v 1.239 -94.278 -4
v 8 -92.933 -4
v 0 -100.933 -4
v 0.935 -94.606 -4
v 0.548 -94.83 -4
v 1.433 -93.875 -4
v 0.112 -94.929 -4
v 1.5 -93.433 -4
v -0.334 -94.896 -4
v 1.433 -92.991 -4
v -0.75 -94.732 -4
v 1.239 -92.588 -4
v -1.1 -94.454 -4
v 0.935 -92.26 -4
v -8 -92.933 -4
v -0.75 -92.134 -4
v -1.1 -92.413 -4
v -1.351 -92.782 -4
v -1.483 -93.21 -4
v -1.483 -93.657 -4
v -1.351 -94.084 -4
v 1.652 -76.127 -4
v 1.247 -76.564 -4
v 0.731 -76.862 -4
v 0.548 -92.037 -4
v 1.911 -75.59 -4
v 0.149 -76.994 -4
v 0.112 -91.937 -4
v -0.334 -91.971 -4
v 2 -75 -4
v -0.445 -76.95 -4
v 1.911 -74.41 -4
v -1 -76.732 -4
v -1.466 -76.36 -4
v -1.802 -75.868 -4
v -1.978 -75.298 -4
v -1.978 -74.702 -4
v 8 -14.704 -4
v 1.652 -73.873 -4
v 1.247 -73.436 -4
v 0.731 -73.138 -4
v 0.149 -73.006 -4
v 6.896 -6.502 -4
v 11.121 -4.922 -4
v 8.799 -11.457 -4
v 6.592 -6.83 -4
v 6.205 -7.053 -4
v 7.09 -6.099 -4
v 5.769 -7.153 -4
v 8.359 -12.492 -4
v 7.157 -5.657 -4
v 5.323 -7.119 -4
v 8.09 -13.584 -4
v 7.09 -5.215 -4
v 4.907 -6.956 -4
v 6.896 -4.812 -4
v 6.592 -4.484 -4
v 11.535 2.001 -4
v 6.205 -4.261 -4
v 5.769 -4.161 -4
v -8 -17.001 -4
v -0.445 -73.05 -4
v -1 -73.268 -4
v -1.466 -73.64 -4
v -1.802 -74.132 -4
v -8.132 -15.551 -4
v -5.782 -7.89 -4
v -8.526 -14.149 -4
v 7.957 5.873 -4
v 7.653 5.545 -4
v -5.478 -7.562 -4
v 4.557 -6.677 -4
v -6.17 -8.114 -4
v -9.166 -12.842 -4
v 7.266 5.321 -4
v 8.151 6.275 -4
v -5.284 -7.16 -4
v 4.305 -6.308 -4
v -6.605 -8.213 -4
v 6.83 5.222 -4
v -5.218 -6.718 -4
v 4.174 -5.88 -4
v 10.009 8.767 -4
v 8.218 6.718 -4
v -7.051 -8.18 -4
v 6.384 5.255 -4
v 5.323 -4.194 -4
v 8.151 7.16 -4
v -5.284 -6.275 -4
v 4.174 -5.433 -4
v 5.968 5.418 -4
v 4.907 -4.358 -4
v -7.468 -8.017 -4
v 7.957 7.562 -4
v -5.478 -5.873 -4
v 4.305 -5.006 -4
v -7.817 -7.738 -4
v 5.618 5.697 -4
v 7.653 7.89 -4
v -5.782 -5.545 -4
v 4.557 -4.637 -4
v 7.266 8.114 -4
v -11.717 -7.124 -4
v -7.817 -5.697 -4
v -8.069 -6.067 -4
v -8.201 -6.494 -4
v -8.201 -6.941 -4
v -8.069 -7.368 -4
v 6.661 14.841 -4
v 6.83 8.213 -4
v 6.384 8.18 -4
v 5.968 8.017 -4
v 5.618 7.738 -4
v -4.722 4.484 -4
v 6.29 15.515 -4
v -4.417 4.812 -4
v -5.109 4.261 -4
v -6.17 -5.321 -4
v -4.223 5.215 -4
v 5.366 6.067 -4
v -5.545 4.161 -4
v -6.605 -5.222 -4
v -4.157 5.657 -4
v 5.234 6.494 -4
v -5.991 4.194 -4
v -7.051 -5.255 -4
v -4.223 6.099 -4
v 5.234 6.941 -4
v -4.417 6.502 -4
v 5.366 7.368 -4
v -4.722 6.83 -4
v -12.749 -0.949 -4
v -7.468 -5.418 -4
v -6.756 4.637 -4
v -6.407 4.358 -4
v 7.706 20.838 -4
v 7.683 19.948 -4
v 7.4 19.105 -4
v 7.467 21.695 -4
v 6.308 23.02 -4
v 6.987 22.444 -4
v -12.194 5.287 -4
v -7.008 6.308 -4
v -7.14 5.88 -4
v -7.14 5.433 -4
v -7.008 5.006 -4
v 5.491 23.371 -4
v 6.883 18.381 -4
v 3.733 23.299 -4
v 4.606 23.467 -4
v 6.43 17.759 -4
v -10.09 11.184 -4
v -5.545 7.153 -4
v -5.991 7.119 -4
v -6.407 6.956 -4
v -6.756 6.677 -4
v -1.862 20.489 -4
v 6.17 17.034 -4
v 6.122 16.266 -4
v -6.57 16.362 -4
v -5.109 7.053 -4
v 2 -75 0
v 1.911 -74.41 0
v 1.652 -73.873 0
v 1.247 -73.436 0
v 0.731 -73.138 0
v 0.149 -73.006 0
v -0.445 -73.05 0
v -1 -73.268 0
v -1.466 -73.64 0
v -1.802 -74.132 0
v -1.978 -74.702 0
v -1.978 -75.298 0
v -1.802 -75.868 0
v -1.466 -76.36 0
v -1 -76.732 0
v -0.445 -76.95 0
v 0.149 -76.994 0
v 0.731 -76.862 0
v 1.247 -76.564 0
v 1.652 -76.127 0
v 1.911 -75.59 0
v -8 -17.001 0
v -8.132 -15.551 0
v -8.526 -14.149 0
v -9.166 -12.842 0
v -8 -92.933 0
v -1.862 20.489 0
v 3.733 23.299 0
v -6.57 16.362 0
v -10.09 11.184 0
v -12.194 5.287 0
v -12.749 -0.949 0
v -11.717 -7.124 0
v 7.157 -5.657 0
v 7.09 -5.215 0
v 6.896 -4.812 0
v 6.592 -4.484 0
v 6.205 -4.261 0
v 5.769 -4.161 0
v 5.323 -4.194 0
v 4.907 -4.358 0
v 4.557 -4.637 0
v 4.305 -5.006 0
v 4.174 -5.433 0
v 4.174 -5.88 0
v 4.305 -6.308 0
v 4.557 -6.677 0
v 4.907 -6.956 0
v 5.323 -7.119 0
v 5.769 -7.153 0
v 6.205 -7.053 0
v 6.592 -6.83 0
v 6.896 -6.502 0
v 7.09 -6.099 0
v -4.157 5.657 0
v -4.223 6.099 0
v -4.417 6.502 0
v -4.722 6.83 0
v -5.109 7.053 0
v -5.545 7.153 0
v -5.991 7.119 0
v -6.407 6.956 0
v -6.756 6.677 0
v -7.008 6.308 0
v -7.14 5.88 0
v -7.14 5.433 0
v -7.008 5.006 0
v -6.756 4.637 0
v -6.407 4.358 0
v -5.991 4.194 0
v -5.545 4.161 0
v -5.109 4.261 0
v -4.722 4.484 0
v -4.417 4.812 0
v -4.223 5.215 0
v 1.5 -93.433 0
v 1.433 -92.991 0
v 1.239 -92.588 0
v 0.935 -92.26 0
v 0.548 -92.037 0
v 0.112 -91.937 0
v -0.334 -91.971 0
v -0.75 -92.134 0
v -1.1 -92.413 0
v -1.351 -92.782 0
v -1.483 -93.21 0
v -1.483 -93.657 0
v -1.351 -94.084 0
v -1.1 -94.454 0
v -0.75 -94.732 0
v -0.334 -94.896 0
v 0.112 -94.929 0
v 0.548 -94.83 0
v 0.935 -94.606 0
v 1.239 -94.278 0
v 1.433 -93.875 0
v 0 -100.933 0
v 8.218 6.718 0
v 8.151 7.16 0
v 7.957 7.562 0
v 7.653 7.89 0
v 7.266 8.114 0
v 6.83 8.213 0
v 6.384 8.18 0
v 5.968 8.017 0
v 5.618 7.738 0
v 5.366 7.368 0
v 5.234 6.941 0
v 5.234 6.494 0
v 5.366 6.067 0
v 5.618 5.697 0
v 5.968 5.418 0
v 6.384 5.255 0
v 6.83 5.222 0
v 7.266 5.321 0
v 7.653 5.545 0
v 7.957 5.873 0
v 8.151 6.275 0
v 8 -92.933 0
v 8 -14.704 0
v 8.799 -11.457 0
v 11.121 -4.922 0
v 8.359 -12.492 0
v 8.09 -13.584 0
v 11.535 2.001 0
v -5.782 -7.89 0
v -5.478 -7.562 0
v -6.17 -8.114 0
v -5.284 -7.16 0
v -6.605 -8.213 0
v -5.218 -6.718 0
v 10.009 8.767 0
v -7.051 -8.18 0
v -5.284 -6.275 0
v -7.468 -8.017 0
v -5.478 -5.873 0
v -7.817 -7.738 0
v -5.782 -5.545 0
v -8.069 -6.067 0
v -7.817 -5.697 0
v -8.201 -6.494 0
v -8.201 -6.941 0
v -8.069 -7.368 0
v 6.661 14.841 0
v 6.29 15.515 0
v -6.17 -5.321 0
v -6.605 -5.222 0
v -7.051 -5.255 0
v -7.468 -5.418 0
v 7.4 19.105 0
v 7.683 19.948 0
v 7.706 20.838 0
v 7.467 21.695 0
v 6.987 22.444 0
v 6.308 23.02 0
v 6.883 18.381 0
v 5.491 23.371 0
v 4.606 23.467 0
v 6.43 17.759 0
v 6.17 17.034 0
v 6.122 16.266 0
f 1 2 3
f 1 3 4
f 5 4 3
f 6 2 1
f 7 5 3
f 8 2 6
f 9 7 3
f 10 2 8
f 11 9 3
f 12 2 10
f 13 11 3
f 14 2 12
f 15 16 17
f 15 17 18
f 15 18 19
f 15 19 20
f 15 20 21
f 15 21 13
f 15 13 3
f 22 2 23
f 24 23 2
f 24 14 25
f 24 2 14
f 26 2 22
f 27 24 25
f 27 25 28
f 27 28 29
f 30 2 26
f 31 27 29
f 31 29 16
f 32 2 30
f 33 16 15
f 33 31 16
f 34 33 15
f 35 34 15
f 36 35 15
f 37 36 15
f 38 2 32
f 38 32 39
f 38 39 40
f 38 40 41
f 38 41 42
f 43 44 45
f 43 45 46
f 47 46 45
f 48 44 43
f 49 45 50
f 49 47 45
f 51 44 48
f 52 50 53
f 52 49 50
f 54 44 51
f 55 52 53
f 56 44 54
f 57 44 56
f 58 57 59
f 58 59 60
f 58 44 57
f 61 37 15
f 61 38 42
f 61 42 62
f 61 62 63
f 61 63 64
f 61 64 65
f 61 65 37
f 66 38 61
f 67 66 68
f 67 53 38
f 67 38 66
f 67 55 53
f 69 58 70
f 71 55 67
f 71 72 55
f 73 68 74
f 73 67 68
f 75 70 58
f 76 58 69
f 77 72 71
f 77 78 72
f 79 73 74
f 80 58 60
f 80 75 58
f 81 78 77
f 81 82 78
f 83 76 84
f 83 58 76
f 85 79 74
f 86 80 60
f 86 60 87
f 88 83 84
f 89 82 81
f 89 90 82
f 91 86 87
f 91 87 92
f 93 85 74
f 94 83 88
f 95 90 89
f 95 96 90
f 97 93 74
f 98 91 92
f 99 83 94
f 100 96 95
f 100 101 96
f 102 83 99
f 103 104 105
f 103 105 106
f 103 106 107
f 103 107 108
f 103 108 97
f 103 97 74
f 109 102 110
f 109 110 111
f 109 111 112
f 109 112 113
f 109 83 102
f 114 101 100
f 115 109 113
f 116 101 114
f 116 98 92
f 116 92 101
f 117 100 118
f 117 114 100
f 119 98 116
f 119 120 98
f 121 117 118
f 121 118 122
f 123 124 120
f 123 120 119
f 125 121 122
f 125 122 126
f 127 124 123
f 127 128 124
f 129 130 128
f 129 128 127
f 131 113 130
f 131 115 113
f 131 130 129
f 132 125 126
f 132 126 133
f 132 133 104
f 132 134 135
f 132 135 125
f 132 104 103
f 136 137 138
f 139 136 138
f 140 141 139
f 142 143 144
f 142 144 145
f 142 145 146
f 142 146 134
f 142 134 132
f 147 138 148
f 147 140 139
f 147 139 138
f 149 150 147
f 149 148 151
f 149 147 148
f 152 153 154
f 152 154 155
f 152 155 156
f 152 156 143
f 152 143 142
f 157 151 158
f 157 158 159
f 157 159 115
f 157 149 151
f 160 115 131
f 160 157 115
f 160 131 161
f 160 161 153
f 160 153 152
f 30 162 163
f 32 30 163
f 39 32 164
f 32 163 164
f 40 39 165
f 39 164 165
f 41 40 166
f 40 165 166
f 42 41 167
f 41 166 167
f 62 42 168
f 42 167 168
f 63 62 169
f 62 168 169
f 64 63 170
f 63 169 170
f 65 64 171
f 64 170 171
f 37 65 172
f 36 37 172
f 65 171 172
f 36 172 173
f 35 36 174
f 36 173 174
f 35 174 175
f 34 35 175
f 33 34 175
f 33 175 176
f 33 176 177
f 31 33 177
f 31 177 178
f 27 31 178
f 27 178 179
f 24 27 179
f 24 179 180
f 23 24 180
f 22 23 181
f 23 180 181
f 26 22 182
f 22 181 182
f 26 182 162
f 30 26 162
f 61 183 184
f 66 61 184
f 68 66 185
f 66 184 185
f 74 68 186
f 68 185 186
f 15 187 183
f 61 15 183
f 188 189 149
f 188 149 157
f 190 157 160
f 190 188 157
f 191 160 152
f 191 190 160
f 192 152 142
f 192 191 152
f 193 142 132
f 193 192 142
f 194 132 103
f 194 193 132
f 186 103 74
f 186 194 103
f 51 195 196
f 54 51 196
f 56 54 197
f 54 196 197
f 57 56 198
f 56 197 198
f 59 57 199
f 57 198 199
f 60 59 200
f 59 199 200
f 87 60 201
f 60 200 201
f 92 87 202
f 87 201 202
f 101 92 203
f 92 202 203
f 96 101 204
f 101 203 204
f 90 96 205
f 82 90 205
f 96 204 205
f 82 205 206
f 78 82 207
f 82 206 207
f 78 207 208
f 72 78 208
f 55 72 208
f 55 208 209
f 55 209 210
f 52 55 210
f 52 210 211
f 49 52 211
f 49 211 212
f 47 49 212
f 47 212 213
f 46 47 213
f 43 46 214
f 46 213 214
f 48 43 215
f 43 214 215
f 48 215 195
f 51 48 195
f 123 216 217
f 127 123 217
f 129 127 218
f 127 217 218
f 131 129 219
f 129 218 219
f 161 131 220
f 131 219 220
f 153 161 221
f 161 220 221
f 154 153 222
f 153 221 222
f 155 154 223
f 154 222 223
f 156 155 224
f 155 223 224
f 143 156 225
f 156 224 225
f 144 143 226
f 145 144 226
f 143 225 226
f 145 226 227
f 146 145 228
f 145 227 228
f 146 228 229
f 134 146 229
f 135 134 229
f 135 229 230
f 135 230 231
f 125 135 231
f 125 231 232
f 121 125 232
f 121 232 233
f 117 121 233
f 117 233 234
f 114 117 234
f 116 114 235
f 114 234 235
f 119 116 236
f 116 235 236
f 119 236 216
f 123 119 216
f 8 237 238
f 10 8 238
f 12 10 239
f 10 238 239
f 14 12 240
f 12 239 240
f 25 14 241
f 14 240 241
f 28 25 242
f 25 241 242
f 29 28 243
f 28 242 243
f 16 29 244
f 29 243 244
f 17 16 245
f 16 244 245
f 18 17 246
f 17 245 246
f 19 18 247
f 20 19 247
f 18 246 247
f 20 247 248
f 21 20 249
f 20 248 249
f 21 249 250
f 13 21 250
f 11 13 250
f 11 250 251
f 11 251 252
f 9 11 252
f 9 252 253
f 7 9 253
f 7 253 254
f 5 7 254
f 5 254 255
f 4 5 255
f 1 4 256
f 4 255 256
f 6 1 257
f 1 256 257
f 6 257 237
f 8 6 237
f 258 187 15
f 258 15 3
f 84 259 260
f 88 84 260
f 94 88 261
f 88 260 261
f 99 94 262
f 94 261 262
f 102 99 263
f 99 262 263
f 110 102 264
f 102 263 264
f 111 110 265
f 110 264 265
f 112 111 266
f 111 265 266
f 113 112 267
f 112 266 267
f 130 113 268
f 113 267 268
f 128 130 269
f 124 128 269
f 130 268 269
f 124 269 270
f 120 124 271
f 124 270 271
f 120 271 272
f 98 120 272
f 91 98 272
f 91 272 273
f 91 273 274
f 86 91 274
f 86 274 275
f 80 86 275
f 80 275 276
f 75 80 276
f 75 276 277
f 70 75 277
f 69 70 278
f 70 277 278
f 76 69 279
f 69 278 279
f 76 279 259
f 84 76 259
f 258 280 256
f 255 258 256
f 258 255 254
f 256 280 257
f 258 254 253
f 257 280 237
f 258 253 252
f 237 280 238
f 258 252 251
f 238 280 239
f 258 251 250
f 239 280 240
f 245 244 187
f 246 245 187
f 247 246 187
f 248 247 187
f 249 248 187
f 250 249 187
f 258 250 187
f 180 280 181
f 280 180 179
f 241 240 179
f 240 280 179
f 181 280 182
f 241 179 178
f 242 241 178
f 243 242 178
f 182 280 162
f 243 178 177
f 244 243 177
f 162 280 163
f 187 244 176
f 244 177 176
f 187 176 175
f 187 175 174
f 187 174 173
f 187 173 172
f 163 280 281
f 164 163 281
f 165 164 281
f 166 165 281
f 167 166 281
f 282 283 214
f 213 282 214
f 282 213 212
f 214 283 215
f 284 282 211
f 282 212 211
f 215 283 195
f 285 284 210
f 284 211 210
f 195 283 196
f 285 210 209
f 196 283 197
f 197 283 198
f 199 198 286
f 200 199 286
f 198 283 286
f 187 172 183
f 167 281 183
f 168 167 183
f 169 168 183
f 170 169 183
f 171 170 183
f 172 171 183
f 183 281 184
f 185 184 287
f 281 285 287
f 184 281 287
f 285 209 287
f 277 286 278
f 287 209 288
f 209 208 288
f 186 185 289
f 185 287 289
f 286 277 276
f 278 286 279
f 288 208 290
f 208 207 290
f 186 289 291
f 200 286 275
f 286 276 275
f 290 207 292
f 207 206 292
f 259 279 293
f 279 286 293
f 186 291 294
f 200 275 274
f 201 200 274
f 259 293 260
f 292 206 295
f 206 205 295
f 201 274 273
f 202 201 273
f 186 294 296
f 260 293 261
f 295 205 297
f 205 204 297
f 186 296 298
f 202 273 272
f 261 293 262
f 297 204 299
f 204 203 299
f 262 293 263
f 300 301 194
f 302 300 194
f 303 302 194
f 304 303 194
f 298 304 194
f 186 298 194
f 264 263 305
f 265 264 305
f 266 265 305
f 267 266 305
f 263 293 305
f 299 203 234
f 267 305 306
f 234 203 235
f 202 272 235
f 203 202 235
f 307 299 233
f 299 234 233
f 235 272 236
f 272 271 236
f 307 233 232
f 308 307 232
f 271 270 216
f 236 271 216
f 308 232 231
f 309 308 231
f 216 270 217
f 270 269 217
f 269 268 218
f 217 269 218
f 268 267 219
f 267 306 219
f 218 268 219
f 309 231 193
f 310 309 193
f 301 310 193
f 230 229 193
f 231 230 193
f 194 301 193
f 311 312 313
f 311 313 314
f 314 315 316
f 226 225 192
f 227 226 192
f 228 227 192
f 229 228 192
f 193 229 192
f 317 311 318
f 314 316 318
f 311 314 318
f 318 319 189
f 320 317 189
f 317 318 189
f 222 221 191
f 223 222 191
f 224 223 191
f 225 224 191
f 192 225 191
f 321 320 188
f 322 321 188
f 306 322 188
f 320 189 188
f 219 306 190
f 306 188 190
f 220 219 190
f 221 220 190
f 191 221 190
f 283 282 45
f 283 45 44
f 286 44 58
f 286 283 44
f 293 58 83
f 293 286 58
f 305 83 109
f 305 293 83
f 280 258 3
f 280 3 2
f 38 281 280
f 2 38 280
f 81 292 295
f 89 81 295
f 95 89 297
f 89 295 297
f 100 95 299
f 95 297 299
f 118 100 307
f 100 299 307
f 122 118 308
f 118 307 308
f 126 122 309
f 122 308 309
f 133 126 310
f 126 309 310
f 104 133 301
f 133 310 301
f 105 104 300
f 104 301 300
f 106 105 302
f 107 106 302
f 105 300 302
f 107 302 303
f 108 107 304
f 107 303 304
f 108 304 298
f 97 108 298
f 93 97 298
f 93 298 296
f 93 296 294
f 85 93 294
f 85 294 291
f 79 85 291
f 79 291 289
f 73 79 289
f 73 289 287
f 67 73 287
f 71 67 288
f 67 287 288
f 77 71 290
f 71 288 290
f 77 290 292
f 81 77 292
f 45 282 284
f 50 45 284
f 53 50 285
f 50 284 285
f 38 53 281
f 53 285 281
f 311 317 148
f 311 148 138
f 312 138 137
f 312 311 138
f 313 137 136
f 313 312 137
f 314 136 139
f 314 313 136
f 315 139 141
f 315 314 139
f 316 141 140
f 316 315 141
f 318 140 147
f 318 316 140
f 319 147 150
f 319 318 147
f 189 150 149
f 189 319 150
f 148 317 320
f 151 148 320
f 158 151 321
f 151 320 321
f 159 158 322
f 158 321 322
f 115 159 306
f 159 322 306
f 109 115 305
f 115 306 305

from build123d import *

# Parameters (mm, degrees)
SKETCH002_R      = 2
SKETCH002_R_2    = 1.5
EXTRUDE001_DEPTH = 4


with BuildPart() as part:
    # Sketch002 → Extrude001 (new body)
    with BuildSketch(Plane.XY):
        with BuildLine():
            Line((-8, -92.933243), (-8, -17.000938))
            ThreePointArc((-8, -17.000938), (-8.297069, -14.84111), (-9.166214, -12.841687))
            ThreePointArc((3.732527, 23.29894), (-11.329683, 8.302585), (-9.166214, -12.841687))
            ThreePointArc((6.882805, 18.381245), (7.254673, 22.087346), (3.732527, 23.29894))
            ThreePointArc((6.882805, 18.381245), (6.118525, 16.652055), (6.660919, 14.84097))
            ThreePointArc((8.798632, -11.457288), (11.535462, 2.001195), (6.660919, 14.84097))
            ThreePointArc((8.798632, -11.457288), (8.20259, -13.032404), (8, -14.704293))
            Line((8, -14.704293), (8, -45.025379))
            Line((8, -45.025379), (8, -92.933243))
            Line((0, -100.933243), (8, -92.933243))
            Line((-8, -92.933243), (0, -100.933243))
        make_face()
        with Locations((0, -75)):
            Circle(SKETCH002_R, mode=Mode.SUBTRACT)
        with Locations((0, -93.433243)):
            Circle(SKETCH002_R_2, mode=Mode.SUBTRACT)
        with Locations((6.717514, 6.717514)):
            Circle(SKETCH002_R_2, mode=Mode.SUBTRACT)
        with Locations((5.656854, -5.656854)):
            Circle(SKETCH002_R_2, mode=Mode.SUBTRACT)
        with Locations((-6.717514, -6.717514)):
            Circle(SKETCH002_R_2, mode=Mode.SUBTRACT)
        with Locations((-5.656854, 5.656854)):
            Circle(SKETCH002_R_2, mode=Mode.SUBTRACT)
    extrude(amount=-EXTRUDE001_DEPTH)


solid = part.part
